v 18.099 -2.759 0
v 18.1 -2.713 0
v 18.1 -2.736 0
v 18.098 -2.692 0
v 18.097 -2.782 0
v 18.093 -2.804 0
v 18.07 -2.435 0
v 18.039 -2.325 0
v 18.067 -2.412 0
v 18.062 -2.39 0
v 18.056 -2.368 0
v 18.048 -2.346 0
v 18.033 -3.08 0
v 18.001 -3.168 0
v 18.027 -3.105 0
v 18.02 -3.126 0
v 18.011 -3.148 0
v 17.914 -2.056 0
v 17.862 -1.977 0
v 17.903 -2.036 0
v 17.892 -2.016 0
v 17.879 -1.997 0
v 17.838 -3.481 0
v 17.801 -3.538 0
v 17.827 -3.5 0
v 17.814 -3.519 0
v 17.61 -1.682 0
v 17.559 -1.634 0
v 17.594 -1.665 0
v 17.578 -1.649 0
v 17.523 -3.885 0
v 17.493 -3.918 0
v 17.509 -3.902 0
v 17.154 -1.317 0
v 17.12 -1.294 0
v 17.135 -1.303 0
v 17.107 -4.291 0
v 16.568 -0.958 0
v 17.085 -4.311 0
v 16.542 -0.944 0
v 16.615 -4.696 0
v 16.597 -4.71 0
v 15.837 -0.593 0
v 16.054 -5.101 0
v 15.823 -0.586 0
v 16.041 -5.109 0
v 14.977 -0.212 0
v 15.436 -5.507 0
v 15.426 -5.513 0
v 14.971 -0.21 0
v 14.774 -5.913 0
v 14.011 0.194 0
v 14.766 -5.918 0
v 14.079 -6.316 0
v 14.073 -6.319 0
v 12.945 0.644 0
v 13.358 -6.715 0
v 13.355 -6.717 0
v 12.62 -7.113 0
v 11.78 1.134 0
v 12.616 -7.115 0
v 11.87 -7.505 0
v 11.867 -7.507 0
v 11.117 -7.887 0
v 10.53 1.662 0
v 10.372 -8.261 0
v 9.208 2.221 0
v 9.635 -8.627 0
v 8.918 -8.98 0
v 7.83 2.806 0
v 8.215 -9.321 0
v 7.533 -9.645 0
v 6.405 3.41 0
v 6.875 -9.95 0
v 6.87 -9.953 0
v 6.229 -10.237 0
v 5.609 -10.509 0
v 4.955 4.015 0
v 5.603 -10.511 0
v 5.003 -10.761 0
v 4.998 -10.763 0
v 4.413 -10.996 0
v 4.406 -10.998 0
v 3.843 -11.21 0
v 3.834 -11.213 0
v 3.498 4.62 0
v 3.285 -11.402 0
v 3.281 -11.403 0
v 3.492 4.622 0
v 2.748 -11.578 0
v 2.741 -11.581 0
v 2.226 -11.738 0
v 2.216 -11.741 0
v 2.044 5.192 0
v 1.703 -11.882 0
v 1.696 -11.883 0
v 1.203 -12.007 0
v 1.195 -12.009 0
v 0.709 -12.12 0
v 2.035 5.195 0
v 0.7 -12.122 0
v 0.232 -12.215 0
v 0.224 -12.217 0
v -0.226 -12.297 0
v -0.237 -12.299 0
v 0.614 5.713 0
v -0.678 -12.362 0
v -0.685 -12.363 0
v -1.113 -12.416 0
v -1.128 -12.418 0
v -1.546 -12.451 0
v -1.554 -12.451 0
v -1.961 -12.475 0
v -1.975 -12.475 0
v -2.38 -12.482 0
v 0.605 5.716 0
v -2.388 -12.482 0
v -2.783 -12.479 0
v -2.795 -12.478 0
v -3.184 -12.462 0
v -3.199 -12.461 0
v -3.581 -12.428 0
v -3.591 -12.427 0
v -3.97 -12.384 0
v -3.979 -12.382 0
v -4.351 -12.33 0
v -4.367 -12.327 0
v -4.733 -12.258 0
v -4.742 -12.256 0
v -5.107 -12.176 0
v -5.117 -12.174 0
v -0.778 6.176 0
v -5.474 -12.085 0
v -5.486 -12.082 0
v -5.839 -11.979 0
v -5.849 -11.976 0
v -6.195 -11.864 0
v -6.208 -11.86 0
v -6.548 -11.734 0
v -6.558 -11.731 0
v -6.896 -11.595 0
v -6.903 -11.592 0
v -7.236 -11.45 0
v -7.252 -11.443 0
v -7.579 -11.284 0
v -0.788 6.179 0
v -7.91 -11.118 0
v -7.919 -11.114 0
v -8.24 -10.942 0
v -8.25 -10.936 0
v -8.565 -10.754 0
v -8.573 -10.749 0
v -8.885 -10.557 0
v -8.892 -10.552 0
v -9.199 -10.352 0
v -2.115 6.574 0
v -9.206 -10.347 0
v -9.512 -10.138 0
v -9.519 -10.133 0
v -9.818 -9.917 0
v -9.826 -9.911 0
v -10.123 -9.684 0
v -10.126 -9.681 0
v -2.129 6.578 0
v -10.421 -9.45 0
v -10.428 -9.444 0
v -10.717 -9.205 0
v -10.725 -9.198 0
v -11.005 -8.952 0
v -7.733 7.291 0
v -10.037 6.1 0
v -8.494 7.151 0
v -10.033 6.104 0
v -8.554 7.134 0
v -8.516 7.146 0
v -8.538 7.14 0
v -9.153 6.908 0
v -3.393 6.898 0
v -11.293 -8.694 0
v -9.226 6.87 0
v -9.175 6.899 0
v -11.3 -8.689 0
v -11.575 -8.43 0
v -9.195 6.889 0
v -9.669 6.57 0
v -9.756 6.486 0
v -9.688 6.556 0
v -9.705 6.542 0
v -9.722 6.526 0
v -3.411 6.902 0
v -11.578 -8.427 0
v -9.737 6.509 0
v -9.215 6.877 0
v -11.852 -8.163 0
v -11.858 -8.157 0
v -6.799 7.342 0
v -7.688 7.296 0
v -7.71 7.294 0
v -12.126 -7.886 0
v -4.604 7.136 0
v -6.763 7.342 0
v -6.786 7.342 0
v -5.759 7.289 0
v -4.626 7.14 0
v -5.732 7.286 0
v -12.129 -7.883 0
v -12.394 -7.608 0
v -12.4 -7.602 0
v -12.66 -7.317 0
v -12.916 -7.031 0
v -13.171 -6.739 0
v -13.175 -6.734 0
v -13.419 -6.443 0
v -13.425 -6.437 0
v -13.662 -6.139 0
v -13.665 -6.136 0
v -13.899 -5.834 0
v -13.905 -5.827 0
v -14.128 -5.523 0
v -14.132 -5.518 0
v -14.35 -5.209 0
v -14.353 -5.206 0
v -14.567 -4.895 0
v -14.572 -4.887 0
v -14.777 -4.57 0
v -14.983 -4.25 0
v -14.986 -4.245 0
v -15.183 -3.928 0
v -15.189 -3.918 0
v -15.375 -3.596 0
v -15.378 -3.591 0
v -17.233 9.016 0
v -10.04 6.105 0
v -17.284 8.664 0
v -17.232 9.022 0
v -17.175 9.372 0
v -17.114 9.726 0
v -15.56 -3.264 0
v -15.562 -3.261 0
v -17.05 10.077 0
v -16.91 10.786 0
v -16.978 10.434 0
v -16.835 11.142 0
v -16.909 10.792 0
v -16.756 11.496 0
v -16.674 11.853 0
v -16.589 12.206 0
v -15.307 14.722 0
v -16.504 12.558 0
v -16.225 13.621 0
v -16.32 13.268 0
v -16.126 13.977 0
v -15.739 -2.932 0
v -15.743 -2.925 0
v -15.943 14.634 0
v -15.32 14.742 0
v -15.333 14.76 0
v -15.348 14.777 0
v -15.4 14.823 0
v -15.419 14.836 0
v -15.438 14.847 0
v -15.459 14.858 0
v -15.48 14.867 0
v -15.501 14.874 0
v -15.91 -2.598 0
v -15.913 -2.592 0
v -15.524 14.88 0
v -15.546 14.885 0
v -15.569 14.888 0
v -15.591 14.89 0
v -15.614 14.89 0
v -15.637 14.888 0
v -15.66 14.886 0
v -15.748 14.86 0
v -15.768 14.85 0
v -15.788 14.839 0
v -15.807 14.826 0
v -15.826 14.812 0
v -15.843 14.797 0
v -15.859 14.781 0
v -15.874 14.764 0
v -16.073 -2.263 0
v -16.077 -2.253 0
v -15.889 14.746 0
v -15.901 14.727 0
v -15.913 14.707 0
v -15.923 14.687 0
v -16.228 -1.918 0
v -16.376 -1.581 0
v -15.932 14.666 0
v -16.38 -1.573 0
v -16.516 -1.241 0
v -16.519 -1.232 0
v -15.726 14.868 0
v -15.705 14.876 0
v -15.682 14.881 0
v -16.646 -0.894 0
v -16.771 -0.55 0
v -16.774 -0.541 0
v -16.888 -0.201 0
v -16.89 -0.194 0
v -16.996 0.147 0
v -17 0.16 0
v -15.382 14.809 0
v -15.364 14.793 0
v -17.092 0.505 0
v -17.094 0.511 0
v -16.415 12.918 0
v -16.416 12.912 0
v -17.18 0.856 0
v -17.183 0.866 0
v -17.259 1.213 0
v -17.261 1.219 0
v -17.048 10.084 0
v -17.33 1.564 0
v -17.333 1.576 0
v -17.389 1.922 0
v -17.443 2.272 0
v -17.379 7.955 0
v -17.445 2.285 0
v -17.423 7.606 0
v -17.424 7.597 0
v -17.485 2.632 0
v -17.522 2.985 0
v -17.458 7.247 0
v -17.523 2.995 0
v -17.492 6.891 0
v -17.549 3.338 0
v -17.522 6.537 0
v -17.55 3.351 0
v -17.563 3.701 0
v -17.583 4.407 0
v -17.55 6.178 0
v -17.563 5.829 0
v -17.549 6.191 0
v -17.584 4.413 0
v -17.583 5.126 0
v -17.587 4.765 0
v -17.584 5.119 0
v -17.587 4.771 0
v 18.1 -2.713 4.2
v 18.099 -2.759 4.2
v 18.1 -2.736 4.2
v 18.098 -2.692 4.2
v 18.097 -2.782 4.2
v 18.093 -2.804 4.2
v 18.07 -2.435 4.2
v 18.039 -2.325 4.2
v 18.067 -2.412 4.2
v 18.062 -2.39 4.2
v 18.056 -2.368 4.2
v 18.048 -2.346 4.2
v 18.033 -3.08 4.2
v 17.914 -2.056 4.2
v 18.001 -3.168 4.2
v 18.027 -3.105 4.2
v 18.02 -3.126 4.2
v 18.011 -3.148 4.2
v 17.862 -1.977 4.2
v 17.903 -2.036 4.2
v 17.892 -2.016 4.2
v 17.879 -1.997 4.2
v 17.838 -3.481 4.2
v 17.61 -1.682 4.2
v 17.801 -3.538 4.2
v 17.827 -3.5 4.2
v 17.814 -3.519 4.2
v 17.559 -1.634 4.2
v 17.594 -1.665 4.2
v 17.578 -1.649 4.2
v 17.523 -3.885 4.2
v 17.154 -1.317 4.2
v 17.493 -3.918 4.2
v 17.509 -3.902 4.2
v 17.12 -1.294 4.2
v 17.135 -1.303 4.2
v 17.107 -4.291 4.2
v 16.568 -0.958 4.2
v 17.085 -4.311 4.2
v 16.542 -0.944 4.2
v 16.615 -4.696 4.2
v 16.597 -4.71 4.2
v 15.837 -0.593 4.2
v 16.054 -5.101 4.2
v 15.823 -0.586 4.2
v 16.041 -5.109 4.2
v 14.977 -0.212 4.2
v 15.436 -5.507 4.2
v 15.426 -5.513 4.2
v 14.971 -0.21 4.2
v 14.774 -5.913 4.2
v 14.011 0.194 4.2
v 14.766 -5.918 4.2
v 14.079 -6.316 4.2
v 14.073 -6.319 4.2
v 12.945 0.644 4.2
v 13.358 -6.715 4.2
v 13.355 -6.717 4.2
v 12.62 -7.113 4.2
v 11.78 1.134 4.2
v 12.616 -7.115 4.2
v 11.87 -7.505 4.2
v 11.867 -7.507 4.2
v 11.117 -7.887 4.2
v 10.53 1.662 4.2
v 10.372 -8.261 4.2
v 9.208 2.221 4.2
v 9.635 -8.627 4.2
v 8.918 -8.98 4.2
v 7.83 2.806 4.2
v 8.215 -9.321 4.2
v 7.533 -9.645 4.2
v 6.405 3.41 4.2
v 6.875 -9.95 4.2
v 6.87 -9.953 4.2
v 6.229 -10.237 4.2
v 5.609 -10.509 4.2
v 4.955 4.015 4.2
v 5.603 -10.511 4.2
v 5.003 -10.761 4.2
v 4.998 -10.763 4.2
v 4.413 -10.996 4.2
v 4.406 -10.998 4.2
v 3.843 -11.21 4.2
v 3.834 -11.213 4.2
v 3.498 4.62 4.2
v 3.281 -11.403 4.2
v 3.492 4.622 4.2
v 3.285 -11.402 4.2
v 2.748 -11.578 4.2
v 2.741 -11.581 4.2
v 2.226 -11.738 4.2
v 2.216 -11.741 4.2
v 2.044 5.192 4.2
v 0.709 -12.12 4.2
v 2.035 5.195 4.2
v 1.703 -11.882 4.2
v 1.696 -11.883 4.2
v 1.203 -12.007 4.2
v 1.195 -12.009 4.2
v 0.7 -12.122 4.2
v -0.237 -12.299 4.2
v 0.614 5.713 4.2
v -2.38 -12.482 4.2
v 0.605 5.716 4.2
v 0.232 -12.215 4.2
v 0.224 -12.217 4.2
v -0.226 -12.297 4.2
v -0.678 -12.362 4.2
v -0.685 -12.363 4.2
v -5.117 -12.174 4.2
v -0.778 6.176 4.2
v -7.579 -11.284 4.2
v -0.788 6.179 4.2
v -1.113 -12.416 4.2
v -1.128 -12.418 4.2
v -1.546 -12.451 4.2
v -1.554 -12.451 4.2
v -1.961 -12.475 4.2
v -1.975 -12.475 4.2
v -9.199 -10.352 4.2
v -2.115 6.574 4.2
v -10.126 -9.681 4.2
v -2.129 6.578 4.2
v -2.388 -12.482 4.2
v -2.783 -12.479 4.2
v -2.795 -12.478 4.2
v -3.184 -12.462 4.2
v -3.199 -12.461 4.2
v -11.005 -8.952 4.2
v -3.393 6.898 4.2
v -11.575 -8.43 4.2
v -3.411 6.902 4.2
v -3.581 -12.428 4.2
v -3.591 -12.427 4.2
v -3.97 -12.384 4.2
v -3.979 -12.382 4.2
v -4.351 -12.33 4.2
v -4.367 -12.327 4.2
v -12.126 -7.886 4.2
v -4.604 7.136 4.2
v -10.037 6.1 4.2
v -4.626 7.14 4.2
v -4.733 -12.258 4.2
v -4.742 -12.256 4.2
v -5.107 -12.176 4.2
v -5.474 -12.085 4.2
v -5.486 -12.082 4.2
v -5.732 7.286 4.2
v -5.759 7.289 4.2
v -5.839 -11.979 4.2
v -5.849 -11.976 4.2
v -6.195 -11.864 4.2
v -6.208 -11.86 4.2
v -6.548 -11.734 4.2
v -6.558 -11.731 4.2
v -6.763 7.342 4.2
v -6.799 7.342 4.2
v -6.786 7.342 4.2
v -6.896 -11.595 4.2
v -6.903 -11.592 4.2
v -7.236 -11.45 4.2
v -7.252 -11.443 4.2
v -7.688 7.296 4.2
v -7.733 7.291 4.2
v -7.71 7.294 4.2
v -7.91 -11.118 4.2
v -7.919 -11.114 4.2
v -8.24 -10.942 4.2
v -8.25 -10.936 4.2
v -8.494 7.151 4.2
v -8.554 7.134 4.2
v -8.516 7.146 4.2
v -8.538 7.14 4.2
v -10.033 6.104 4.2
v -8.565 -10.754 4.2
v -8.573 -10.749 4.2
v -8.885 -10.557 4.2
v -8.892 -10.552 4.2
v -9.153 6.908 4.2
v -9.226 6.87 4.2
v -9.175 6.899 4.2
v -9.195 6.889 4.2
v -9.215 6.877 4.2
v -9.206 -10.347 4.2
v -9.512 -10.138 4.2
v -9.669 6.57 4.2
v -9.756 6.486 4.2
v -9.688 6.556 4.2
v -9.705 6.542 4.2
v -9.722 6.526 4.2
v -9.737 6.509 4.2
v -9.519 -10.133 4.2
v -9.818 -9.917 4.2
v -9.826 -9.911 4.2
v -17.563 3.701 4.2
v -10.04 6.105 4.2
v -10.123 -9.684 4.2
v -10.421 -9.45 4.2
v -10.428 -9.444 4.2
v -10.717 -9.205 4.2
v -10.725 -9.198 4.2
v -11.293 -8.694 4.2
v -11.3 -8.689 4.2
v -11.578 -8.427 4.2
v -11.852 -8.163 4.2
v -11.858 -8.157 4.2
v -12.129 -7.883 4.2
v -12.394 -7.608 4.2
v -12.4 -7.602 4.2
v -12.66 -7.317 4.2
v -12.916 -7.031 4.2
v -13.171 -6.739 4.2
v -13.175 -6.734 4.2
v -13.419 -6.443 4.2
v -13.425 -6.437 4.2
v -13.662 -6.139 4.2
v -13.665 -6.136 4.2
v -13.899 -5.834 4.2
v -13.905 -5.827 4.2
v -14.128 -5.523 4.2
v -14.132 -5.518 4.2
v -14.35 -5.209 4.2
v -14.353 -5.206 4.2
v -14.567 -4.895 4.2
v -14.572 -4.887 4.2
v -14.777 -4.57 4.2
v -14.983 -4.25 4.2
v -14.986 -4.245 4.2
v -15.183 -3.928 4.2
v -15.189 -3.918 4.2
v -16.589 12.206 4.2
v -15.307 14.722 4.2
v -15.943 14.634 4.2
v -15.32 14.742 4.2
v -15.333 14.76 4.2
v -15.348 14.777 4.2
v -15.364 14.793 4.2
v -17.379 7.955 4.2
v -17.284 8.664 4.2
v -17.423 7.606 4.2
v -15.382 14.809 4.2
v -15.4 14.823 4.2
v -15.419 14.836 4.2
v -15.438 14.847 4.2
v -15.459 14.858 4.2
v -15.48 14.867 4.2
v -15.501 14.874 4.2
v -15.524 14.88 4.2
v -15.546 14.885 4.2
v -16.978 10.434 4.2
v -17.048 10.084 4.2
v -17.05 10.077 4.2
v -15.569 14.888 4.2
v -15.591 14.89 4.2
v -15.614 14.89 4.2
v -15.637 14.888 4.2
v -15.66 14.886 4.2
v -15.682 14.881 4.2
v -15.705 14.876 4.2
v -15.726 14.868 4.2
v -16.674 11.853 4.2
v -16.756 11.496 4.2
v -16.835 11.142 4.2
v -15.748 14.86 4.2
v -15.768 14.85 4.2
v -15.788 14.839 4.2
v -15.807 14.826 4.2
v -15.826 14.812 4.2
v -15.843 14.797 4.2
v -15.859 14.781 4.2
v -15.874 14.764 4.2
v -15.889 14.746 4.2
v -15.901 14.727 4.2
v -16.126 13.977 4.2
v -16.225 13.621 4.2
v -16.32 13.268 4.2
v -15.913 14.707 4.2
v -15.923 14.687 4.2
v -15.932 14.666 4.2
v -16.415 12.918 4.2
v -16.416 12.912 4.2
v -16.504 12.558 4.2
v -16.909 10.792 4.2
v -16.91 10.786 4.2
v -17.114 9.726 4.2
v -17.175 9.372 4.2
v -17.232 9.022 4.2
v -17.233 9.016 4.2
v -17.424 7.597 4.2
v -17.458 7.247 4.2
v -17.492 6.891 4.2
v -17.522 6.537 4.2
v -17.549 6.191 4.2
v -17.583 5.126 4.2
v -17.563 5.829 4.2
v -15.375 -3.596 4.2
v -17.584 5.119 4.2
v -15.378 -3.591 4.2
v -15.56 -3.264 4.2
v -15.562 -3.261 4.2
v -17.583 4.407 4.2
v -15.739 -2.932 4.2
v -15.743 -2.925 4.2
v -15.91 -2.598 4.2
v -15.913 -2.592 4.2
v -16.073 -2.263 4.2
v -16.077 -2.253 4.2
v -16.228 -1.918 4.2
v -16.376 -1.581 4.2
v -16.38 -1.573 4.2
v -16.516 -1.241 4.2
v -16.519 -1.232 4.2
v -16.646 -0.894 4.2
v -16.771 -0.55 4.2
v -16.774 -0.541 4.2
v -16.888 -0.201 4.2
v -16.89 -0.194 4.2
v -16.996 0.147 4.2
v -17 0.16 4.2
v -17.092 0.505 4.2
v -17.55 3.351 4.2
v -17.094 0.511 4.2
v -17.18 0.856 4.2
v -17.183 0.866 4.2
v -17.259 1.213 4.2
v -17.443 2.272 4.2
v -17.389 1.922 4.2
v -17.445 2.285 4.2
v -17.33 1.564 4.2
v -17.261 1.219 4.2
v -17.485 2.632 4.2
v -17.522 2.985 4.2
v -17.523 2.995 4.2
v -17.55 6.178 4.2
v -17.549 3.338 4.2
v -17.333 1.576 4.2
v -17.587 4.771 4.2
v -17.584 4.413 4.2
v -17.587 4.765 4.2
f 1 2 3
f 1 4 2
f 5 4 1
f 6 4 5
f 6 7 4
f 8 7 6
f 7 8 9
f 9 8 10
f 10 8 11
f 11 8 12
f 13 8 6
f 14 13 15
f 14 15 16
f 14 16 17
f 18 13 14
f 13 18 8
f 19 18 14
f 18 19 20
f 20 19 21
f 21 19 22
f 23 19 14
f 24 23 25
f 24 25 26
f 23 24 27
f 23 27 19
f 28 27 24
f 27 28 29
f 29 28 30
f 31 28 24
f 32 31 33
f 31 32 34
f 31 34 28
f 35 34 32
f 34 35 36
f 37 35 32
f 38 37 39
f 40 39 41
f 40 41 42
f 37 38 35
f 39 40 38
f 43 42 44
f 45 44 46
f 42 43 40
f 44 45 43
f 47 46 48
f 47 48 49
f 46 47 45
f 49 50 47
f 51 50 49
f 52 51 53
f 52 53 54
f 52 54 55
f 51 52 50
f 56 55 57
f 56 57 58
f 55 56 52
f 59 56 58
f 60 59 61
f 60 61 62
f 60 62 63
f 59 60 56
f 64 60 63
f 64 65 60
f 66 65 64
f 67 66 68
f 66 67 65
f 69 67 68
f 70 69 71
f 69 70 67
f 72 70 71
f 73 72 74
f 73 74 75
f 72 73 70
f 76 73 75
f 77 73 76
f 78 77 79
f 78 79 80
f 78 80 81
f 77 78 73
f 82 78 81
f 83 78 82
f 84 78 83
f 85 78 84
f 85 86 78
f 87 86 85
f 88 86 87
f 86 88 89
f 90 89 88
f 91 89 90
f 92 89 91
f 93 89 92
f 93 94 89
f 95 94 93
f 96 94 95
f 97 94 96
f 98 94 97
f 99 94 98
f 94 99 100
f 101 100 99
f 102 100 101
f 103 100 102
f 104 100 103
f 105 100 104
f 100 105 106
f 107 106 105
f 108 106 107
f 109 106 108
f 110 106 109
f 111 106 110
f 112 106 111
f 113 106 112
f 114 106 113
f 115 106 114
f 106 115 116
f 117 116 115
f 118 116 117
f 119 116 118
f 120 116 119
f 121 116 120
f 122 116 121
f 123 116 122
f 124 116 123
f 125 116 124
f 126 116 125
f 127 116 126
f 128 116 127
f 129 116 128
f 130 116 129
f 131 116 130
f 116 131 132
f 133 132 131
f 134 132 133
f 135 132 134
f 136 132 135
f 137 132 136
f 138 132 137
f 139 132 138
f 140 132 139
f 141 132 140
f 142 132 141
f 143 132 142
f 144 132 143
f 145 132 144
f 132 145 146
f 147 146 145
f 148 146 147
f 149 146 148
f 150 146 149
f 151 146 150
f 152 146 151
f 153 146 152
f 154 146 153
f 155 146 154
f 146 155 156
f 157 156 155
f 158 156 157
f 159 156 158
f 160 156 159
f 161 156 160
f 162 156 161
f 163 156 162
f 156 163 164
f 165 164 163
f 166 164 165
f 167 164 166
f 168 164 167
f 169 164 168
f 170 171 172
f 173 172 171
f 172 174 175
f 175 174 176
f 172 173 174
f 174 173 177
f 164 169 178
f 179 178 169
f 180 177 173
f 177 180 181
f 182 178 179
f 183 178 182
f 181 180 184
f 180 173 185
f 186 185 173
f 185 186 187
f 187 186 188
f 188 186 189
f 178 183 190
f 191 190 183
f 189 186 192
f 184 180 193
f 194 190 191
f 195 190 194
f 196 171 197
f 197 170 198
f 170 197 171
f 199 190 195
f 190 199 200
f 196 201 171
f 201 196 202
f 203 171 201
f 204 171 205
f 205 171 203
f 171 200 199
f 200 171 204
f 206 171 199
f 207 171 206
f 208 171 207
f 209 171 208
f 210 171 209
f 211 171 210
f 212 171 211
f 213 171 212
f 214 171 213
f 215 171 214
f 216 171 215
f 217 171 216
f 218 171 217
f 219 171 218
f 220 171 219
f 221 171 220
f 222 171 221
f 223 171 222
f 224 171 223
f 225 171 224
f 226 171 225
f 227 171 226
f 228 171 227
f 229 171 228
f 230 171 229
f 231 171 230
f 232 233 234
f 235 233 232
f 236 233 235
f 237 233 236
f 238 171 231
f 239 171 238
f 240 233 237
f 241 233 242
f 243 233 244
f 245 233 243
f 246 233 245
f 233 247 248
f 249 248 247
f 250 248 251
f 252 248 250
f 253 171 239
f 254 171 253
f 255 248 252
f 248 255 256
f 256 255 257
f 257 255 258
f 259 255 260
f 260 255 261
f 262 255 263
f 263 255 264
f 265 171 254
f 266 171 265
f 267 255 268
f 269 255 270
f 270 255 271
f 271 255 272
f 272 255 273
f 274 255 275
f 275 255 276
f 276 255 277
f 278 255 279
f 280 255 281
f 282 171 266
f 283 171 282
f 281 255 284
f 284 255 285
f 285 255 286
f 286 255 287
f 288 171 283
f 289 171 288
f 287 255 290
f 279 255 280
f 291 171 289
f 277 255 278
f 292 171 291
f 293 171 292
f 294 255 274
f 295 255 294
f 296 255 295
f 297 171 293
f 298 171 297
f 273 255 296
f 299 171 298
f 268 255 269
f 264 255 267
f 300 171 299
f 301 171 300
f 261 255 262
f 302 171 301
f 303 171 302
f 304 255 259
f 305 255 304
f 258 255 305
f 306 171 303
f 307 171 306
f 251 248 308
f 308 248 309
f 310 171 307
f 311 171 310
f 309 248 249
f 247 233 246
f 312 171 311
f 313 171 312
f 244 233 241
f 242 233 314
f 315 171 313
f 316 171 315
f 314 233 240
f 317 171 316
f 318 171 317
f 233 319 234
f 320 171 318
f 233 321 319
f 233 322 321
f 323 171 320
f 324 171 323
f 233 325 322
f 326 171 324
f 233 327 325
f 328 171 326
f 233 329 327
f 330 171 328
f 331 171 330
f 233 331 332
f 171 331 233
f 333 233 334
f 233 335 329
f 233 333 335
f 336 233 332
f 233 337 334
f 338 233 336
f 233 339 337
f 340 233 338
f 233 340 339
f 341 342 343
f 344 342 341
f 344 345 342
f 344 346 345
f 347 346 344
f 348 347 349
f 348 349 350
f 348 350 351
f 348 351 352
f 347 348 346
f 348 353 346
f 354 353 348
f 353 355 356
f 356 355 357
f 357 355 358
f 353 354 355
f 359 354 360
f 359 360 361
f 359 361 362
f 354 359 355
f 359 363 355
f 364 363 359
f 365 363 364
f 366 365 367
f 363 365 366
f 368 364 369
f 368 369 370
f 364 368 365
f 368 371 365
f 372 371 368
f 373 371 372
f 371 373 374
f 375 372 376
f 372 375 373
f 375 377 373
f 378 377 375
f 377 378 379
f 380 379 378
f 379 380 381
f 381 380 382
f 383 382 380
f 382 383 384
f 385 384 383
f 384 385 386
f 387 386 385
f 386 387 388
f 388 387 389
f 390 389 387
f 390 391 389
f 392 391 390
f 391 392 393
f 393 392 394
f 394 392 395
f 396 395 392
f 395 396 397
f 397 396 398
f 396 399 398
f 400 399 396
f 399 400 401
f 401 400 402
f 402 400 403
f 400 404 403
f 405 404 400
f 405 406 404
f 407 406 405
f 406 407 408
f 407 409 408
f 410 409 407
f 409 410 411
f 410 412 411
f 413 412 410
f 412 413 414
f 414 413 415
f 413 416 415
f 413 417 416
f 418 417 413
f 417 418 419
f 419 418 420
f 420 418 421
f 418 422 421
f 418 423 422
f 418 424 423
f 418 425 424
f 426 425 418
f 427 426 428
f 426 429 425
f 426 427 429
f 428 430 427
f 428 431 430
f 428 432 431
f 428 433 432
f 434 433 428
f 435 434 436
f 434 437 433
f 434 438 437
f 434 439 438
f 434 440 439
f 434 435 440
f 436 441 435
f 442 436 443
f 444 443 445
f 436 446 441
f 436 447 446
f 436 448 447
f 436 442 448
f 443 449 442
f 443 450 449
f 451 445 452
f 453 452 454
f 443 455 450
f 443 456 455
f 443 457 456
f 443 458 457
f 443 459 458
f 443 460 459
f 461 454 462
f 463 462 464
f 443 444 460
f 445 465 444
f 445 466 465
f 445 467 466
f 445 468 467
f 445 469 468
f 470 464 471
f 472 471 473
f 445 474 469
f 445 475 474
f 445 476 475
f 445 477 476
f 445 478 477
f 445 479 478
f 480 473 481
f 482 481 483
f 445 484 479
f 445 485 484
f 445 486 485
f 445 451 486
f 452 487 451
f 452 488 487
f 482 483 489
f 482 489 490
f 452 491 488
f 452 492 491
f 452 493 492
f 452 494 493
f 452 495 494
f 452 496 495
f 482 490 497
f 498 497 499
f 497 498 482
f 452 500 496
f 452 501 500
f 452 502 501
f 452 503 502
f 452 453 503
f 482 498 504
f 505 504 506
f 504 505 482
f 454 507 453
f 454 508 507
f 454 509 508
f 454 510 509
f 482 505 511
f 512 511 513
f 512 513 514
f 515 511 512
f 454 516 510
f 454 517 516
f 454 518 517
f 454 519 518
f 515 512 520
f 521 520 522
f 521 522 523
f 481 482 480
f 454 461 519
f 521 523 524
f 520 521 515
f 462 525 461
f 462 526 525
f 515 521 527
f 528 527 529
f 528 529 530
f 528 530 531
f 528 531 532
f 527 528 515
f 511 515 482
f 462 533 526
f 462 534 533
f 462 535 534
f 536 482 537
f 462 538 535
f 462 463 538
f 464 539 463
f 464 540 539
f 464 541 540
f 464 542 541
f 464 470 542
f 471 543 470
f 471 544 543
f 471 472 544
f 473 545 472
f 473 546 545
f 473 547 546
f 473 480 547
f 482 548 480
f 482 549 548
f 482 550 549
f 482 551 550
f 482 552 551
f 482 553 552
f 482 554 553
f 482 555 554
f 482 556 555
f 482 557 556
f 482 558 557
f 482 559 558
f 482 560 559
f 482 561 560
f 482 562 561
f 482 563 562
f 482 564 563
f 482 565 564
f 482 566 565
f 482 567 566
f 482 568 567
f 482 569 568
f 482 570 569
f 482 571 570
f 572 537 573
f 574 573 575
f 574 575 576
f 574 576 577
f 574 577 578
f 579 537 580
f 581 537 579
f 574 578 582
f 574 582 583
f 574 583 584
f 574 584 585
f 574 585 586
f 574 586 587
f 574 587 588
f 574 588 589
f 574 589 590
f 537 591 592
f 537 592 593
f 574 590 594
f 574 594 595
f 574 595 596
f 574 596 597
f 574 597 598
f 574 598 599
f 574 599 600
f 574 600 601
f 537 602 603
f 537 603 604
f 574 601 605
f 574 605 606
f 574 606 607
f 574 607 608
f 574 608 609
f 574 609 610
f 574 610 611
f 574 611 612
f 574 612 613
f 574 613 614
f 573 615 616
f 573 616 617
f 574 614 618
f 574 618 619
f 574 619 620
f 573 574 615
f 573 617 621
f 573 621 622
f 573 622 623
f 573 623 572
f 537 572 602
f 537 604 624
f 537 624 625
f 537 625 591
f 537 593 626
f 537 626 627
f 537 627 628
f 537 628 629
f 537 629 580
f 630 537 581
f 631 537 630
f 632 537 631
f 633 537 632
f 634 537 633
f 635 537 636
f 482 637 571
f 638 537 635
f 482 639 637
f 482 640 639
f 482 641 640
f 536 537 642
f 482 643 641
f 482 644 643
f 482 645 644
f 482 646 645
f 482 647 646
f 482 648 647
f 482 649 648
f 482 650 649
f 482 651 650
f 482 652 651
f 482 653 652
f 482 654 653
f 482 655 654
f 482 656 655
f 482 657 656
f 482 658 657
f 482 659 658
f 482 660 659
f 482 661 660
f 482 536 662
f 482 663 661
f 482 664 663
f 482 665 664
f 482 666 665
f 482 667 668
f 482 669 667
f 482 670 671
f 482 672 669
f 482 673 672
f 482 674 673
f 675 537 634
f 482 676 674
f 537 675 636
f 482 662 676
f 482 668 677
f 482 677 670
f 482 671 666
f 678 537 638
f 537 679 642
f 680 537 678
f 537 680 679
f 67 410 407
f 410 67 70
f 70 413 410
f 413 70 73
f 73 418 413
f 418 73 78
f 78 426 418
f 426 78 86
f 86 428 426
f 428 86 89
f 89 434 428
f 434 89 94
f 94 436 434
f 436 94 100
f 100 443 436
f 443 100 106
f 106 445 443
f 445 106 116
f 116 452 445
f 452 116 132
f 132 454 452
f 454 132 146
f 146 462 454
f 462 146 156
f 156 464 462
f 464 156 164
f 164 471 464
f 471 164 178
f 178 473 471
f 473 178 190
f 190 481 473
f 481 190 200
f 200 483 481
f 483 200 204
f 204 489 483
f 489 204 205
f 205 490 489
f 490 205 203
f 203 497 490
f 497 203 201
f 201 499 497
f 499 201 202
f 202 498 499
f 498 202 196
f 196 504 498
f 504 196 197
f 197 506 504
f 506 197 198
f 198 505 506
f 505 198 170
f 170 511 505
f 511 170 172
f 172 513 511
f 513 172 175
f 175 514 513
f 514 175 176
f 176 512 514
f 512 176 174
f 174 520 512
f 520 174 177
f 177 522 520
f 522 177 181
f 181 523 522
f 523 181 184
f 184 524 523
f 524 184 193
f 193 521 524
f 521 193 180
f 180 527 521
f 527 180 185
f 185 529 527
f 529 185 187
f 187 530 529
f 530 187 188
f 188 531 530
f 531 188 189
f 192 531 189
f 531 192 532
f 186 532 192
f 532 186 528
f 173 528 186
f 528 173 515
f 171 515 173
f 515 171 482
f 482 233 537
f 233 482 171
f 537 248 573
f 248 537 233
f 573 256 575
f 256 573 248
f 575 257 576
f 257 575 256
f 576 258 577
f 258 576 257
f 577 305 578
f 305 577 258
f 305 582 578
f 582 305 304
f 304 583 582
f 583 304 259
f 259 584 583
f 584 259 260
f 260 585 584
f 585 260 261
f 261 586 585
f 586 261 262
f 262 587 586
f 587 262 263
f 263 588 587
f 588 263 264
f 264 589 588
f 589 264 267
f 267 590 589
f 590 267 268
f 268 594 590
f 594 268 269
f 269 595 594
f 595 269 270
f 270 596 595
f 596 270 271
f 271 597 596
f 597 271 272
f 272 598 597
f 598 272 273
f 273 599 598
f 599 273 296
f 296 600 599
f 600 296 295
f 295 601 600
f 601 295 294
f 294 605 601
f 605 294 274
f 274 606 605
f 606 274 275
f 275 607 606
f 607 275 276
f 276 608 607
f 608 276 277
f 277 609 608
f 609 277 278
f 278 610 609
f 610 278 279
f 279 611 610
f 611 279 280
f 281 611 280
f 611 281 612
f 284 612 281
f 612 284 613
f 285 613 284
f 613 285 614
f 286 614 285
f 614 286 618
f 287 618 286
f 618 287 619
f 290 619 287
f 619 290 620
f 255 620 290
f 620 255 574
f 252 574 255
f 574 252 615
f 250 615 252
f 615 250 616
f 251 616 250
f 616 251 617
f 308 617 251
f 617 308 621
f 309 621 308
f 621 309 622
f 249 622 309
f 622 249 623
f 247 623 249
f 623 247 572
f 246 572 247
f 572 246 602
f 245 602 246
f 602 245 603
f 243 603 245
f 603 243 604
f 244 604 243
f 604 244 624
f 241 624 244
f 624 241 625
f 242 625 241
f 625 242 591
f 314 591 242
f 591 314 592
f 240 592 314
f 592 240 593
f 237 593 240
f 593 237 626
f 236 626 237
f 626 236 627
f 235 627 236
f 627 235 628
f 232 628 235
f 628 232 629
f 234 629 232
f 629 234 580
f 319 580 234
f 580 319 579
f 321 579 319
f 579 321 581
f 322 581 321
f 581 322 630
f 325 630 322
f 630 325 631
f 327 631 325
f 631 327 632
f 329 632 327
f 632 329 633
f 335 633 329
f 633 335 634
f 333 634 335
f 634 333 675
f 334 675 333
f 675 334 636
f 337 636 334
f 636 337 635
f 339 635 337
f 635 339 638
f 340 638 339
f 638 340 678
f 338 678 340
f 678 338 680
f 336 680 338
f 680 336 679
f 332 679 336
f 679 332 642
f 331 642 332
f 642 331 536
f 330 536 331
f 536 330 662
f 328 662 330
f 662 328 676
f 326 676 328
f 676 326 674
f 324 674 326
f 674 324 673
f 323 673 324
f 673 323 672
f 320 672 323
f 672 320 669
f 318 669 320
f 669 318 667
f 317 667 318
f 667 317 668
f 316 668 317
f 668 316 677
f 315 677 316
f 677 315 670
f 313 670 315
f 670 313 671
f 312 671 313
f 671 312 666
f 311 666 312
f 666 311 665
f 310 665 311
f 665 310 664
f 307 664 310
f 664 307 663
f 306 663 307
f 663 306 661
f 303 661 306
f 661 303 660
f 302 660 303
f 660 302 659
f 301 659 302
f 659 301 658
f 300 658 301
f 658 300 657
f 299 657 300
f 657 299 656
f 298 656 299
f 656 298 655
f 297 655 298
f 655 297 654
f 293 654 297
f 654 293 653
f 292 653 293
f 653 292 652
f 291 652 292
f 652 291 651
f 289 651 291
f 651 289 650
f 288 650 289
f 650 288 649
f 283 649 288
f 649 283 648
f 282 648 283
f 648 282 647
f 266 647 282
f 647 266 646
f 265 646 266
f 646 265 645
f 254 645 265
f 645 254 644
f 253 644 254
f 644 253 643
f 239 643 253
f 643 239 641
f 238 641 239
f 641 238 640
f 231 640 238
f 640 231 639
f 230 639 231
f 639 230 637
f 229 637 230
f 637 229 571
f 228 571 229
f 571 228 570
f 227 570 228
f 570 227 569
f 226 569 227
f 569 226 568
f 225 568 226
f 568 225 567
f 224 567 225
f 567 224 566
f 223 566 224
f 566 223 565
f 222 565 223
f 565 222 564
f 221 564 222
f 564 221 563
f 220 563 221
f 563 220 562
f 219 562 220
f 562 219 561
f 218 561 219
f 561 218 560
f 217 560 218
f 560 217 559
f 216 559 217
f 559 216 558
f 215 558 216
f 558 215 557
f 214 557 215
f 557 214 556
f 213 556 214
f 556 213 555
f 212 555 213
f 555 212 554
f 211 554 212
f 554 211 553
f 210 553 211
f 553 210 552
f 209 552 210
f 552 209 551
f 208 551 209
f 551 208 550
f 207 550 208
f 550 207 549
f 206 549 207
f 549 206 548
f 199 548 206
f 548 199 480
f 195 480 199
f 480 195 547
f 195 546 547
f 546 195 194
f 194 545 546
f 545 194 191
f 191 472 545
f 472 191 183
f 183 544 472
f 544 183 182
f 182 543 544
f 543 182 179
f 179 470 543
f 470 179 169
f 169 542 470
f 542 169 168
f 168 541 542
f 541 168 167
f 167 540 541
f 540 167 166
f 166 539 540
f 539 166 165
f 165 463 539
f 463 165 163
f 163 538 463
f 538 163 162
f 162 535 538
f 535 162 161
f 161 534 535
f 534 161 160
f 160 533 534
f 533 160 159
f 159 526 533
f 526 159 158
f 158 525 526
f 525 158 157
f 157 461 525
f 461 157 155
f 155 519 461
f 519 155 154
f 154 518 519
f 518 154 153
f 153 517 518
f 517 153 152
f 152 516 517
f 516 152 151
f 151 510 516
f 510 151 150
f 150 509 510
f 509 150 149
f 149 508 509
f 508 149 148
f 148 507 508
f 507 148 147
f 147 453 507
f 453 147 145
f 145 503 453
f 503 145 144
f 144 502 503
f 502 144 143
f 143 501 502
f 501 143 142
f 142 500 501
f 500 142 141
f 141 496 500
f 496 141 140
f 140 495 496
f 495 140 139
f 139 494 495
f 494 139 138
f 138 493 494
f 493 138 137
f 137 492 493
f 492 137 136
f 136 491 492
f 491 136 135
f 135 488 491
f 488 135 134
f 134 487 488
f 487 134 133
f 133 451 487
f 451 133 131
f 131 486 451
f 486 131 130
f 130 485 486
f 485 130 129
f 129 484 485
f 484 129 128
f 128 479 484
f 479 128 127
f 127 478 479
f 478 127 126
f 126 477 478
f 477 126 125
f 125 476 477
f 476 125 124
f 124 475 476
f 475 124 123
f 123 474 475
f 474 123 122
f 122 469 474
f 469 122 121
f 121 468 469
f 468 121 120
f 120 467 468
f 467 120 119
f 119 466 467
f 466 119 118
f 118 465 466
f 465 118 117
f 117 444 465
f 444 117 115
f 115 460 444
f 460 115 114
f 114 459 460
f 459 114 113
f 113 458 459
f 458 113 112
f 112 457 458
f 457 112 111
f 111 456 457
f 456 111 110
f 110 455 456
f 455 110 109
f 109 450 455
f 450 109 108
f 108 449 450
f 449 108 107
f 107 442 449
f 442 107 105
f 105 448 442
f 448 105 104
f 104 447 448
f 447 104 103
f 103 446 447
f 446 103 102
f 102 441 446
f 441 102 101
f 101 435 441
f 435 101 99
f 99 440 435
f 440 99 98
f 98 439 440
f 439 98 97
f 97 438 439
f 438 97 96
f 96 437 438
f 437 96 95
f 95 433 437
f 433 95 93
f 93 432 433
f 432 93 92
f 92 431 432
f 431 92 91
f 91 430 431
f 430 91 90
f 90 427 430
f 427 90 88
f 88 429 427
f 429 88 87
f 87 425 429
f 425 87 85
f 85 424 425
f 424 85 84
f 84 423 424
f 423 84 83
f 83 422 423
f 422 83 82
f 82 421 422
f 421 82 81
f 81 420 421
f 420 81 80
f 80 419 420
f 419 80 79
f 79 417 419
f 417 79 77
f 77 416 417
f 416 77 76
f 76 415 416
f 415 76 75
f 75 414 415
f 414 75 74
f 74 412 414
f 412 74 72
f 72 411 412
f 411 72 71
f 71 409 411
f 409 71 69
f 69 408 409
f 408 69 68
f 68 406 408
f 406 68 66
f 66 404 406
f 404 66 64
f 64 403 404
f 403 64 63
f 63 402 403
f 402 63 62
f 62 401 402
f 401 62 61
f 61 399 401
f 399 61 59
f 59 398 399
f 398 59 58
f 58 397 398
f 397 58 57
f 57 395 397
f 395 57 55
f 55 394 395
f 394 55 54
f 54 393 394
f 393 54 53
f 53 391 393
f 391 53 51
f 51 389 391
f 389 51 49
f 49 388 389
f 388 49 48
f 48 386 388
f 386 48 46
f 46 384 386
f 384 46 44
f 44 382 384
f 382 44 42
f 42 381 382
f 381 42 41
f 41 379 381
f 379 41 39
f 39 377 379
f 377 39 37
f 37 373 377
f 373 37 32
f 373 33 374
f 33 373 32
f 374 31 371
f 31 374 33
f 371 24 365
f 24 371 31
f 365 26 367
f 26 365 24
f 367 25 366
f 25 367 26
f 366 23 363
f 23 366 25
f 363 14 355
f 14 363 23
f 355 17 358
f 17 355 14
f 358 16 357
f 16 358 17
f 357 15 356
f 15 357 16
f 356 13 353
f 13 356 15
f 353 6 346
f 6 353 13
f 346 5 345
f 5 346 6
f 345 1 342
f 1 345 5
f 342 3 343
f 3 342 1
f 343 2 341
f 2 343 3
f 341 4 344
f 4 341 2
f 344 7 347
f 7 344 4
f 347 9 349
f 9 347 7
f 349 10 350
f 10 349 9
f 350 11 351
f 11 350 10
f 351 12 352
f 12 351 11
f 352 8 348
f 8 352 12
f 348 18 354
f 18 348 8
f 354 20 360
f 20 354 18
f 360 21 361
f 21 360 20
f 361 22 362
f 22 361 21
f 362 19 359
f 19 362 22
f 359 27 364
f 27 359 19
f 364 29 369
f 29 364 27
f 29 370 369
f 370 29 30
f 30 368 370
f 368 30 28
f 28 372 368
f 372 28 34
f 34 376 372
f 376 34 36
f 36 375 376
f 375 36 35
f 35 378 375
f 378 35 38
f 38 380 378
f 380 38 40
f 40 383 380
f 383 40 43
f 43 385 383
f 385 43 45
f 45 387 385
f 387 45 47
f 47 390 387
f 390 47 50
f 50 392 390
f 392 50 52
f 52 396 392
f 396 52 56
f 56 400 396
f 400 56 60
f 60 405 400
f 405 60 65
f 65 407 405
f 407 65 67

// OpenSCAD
$fn=96;
thickness_mm = 4.2;
pts = [[-10.0366, 6.0996], [-9.7199, 6.5355], [-9.192, 6.8931], [-8.5245, 7.1451], [-7.7105, 7.295], [-6.7807, 7.3427], [-5.7454, 7.2882], [-4.6147, 7.1383], [-3.4023, 6.8999], [-2.1217, 6.5764], [-0.7833, 6.1779], [0.6096, 5.7148], [2.04, 5.1937], [3.4942, 4.6215], [4.9553, 4.0153], [6.4061, 3.4091], [7.8297, 2.8063], [9.209, 2.2205], [10.5304, 1.662], [11.7803, 1.1341], [12.945, 0.6437], [14.011, 0.1941], [14.9748, -0.2112], [15.8297, -0.5892], [16.5551, -0.9502], [17.1375, -1.3044], [17.587, -1.6552], [17.8935, -2.0128], [18.0638, -2.3772], [18.1047, -2.7484], [18.0229, -3.1264], [17.822, -3.5113], [17.5087, -3.9029], [17.0966, -4.3014], [16.6062, -4.7033], [16.0476, -5.1051], [15.4312, -5.5104], [14.7705, -5.9157], [14.0757, -6.3176], [13.3571, -6.716], [12.6181, -7.1145], [11.8688, -7.5061], [11.1162, -7.8876], [10.3703, -8.2622], [9.6347, -8.6266], [8.9161, -8.9808], [8.2145, -9.3214], [7.5334, -9.6449], [6.8727, -9.9514], [6.229, -10.2375], [5.6058, -10.51], [4.9996, -10.762], [4.4104, -10.997], [3.8382, -11.2115], [3.2831, -11.4023], [2.745, -11.5794], [2.2205, -11.7394], [1.6994, -11.8825], [1.1988, -12.0085], [0.705, -12.1209], [0.2282, -12.2162], [-0.2316, -12.298], [-0.6811, -12.3627], [-1.1205, -12.4172], [-1.5496, -12.4512], [-1.9685, -12.4751], [-2.384, -12.4819], [-2.7893, -12.4785], [-3.1911, -12.4614], [-3.5862, -12.4274], [-3.9744, -12.3831], [-4.3593, -12.3286], [-4.7373, -12.2571], [-5.1119, -12.1754], [-5.4798, -12.0834], [-5.8442, -11.9778], [-6.2018, -11.862], [-6.5526, -11.7326], [-6.8999, -11.593], [-7.2439, -11.4465], [-7.5811, -11.2831], [-7.9148, -11.1162], [-8.2452, -10.9391], [-8.5687, -10.7518], [-8.8889, -10.5542], [-9.2022, -10.3499], [-9.5155, -10.1353], [-9.822, -9.914], [-10.1251, -9.6824], [-10.4248, -9.4474], [-10.7211, -9.2022], [-11.0072, -8.9502], [-11.2967, -8.6913], [-11.576, -8.4291], [-11.8552, -8.16], [-12.1277, -7.8842], [-12.3967, -7.6049], [-12.659, -7.3188], [-12.9178, -7.0294], [-13.1732, -6.7365], [-13.4218, -6.4402], [-13.6636, -6.1371], [-13.902, -5.8305], [-14.1302, -5.5206], [-14.3516, -5.2073], [-14.5696, -4.8906], [-14.7773, -4.5704], [-14.9851, -4.2469], [-15.186, -3.9234], [-15.3767, -3.593], [-15.5606, -3.2627], [-15.7411, -2.9289], [-15.9114, -2.5951], [-16.0749, -2.258], [-16.2281, -1.9174], [-16.378, -1.5768], [-16.5176, -1.2363], [-16.647, -0.8923], [-16.773, -0.5449], [-16.8888, -0.1975], [-16.9978, 0.1533], [-17.0932, 0.5074], [-17.1817, 0.8616], [-17.2601, 1.2158], [-17.3316, 1.57], [-17.3895, 1.9242], [-17.444, 2.2784], [-17.4848, 2.6326], [-17.5223, 2.9902], [-17.5495, 3.3444], [-17.5632, 3.702], [-17.5734, 4.0562], [-17.5836, 4.4104], [-17.587, 4.768], [-17.5836, 5.1222], [-17.5734, 5.4764], [-17.5632, 5.8305], [-17.5495, 6.1847], [-17.5223, 6.5389], [-17.4916, 6.8931], [-17.4576, 7.2473], [-17.4235, 7.6015], [-17.3793, 7.9557], [-17.3316, 8.3099], [-17.2839, 8.6641], [-17.2328, 9.0183], [-17.1749, 9.3725], [-17.1136, 9.7267], [-17.0489, 10.0809], [-16.9774, 10.435], [-16.9093, 10.7892], [-16.8343, 11.1434], [-16.756, 11.4976], [-16.6743, 11.8518], [-16.5891, 12.206], [-16.504, 12.5602], [-16.4154, 12.9144], [-16.3201, 13.2686], [-16.2247, 13.6228], [-16.126, 13.977], [-16.0272, 14.3312], [-15.9284, 14.6854], [-15.8229, 15.0395], [-15.7173, 15.3937]];
hole = [1.31, 16.23, 2.53];
module shape2d(){
  // Fix: clean self-intersections / bad contours for CGAL render
  offset(r=0.35) offset(r=-0.35)
    polygon(points=pts, paths=[[for(i=[0:len(pts)-1]) i]]);
}
module body(){
  linear_extrude(height=thickness_mm, convexity=10)
    shape2d();
}
difference(){
  body();
  translate([hole[0], hole[1], -1])
    cylinder(h=thickness_mm+2, r=hole[2]);
}
